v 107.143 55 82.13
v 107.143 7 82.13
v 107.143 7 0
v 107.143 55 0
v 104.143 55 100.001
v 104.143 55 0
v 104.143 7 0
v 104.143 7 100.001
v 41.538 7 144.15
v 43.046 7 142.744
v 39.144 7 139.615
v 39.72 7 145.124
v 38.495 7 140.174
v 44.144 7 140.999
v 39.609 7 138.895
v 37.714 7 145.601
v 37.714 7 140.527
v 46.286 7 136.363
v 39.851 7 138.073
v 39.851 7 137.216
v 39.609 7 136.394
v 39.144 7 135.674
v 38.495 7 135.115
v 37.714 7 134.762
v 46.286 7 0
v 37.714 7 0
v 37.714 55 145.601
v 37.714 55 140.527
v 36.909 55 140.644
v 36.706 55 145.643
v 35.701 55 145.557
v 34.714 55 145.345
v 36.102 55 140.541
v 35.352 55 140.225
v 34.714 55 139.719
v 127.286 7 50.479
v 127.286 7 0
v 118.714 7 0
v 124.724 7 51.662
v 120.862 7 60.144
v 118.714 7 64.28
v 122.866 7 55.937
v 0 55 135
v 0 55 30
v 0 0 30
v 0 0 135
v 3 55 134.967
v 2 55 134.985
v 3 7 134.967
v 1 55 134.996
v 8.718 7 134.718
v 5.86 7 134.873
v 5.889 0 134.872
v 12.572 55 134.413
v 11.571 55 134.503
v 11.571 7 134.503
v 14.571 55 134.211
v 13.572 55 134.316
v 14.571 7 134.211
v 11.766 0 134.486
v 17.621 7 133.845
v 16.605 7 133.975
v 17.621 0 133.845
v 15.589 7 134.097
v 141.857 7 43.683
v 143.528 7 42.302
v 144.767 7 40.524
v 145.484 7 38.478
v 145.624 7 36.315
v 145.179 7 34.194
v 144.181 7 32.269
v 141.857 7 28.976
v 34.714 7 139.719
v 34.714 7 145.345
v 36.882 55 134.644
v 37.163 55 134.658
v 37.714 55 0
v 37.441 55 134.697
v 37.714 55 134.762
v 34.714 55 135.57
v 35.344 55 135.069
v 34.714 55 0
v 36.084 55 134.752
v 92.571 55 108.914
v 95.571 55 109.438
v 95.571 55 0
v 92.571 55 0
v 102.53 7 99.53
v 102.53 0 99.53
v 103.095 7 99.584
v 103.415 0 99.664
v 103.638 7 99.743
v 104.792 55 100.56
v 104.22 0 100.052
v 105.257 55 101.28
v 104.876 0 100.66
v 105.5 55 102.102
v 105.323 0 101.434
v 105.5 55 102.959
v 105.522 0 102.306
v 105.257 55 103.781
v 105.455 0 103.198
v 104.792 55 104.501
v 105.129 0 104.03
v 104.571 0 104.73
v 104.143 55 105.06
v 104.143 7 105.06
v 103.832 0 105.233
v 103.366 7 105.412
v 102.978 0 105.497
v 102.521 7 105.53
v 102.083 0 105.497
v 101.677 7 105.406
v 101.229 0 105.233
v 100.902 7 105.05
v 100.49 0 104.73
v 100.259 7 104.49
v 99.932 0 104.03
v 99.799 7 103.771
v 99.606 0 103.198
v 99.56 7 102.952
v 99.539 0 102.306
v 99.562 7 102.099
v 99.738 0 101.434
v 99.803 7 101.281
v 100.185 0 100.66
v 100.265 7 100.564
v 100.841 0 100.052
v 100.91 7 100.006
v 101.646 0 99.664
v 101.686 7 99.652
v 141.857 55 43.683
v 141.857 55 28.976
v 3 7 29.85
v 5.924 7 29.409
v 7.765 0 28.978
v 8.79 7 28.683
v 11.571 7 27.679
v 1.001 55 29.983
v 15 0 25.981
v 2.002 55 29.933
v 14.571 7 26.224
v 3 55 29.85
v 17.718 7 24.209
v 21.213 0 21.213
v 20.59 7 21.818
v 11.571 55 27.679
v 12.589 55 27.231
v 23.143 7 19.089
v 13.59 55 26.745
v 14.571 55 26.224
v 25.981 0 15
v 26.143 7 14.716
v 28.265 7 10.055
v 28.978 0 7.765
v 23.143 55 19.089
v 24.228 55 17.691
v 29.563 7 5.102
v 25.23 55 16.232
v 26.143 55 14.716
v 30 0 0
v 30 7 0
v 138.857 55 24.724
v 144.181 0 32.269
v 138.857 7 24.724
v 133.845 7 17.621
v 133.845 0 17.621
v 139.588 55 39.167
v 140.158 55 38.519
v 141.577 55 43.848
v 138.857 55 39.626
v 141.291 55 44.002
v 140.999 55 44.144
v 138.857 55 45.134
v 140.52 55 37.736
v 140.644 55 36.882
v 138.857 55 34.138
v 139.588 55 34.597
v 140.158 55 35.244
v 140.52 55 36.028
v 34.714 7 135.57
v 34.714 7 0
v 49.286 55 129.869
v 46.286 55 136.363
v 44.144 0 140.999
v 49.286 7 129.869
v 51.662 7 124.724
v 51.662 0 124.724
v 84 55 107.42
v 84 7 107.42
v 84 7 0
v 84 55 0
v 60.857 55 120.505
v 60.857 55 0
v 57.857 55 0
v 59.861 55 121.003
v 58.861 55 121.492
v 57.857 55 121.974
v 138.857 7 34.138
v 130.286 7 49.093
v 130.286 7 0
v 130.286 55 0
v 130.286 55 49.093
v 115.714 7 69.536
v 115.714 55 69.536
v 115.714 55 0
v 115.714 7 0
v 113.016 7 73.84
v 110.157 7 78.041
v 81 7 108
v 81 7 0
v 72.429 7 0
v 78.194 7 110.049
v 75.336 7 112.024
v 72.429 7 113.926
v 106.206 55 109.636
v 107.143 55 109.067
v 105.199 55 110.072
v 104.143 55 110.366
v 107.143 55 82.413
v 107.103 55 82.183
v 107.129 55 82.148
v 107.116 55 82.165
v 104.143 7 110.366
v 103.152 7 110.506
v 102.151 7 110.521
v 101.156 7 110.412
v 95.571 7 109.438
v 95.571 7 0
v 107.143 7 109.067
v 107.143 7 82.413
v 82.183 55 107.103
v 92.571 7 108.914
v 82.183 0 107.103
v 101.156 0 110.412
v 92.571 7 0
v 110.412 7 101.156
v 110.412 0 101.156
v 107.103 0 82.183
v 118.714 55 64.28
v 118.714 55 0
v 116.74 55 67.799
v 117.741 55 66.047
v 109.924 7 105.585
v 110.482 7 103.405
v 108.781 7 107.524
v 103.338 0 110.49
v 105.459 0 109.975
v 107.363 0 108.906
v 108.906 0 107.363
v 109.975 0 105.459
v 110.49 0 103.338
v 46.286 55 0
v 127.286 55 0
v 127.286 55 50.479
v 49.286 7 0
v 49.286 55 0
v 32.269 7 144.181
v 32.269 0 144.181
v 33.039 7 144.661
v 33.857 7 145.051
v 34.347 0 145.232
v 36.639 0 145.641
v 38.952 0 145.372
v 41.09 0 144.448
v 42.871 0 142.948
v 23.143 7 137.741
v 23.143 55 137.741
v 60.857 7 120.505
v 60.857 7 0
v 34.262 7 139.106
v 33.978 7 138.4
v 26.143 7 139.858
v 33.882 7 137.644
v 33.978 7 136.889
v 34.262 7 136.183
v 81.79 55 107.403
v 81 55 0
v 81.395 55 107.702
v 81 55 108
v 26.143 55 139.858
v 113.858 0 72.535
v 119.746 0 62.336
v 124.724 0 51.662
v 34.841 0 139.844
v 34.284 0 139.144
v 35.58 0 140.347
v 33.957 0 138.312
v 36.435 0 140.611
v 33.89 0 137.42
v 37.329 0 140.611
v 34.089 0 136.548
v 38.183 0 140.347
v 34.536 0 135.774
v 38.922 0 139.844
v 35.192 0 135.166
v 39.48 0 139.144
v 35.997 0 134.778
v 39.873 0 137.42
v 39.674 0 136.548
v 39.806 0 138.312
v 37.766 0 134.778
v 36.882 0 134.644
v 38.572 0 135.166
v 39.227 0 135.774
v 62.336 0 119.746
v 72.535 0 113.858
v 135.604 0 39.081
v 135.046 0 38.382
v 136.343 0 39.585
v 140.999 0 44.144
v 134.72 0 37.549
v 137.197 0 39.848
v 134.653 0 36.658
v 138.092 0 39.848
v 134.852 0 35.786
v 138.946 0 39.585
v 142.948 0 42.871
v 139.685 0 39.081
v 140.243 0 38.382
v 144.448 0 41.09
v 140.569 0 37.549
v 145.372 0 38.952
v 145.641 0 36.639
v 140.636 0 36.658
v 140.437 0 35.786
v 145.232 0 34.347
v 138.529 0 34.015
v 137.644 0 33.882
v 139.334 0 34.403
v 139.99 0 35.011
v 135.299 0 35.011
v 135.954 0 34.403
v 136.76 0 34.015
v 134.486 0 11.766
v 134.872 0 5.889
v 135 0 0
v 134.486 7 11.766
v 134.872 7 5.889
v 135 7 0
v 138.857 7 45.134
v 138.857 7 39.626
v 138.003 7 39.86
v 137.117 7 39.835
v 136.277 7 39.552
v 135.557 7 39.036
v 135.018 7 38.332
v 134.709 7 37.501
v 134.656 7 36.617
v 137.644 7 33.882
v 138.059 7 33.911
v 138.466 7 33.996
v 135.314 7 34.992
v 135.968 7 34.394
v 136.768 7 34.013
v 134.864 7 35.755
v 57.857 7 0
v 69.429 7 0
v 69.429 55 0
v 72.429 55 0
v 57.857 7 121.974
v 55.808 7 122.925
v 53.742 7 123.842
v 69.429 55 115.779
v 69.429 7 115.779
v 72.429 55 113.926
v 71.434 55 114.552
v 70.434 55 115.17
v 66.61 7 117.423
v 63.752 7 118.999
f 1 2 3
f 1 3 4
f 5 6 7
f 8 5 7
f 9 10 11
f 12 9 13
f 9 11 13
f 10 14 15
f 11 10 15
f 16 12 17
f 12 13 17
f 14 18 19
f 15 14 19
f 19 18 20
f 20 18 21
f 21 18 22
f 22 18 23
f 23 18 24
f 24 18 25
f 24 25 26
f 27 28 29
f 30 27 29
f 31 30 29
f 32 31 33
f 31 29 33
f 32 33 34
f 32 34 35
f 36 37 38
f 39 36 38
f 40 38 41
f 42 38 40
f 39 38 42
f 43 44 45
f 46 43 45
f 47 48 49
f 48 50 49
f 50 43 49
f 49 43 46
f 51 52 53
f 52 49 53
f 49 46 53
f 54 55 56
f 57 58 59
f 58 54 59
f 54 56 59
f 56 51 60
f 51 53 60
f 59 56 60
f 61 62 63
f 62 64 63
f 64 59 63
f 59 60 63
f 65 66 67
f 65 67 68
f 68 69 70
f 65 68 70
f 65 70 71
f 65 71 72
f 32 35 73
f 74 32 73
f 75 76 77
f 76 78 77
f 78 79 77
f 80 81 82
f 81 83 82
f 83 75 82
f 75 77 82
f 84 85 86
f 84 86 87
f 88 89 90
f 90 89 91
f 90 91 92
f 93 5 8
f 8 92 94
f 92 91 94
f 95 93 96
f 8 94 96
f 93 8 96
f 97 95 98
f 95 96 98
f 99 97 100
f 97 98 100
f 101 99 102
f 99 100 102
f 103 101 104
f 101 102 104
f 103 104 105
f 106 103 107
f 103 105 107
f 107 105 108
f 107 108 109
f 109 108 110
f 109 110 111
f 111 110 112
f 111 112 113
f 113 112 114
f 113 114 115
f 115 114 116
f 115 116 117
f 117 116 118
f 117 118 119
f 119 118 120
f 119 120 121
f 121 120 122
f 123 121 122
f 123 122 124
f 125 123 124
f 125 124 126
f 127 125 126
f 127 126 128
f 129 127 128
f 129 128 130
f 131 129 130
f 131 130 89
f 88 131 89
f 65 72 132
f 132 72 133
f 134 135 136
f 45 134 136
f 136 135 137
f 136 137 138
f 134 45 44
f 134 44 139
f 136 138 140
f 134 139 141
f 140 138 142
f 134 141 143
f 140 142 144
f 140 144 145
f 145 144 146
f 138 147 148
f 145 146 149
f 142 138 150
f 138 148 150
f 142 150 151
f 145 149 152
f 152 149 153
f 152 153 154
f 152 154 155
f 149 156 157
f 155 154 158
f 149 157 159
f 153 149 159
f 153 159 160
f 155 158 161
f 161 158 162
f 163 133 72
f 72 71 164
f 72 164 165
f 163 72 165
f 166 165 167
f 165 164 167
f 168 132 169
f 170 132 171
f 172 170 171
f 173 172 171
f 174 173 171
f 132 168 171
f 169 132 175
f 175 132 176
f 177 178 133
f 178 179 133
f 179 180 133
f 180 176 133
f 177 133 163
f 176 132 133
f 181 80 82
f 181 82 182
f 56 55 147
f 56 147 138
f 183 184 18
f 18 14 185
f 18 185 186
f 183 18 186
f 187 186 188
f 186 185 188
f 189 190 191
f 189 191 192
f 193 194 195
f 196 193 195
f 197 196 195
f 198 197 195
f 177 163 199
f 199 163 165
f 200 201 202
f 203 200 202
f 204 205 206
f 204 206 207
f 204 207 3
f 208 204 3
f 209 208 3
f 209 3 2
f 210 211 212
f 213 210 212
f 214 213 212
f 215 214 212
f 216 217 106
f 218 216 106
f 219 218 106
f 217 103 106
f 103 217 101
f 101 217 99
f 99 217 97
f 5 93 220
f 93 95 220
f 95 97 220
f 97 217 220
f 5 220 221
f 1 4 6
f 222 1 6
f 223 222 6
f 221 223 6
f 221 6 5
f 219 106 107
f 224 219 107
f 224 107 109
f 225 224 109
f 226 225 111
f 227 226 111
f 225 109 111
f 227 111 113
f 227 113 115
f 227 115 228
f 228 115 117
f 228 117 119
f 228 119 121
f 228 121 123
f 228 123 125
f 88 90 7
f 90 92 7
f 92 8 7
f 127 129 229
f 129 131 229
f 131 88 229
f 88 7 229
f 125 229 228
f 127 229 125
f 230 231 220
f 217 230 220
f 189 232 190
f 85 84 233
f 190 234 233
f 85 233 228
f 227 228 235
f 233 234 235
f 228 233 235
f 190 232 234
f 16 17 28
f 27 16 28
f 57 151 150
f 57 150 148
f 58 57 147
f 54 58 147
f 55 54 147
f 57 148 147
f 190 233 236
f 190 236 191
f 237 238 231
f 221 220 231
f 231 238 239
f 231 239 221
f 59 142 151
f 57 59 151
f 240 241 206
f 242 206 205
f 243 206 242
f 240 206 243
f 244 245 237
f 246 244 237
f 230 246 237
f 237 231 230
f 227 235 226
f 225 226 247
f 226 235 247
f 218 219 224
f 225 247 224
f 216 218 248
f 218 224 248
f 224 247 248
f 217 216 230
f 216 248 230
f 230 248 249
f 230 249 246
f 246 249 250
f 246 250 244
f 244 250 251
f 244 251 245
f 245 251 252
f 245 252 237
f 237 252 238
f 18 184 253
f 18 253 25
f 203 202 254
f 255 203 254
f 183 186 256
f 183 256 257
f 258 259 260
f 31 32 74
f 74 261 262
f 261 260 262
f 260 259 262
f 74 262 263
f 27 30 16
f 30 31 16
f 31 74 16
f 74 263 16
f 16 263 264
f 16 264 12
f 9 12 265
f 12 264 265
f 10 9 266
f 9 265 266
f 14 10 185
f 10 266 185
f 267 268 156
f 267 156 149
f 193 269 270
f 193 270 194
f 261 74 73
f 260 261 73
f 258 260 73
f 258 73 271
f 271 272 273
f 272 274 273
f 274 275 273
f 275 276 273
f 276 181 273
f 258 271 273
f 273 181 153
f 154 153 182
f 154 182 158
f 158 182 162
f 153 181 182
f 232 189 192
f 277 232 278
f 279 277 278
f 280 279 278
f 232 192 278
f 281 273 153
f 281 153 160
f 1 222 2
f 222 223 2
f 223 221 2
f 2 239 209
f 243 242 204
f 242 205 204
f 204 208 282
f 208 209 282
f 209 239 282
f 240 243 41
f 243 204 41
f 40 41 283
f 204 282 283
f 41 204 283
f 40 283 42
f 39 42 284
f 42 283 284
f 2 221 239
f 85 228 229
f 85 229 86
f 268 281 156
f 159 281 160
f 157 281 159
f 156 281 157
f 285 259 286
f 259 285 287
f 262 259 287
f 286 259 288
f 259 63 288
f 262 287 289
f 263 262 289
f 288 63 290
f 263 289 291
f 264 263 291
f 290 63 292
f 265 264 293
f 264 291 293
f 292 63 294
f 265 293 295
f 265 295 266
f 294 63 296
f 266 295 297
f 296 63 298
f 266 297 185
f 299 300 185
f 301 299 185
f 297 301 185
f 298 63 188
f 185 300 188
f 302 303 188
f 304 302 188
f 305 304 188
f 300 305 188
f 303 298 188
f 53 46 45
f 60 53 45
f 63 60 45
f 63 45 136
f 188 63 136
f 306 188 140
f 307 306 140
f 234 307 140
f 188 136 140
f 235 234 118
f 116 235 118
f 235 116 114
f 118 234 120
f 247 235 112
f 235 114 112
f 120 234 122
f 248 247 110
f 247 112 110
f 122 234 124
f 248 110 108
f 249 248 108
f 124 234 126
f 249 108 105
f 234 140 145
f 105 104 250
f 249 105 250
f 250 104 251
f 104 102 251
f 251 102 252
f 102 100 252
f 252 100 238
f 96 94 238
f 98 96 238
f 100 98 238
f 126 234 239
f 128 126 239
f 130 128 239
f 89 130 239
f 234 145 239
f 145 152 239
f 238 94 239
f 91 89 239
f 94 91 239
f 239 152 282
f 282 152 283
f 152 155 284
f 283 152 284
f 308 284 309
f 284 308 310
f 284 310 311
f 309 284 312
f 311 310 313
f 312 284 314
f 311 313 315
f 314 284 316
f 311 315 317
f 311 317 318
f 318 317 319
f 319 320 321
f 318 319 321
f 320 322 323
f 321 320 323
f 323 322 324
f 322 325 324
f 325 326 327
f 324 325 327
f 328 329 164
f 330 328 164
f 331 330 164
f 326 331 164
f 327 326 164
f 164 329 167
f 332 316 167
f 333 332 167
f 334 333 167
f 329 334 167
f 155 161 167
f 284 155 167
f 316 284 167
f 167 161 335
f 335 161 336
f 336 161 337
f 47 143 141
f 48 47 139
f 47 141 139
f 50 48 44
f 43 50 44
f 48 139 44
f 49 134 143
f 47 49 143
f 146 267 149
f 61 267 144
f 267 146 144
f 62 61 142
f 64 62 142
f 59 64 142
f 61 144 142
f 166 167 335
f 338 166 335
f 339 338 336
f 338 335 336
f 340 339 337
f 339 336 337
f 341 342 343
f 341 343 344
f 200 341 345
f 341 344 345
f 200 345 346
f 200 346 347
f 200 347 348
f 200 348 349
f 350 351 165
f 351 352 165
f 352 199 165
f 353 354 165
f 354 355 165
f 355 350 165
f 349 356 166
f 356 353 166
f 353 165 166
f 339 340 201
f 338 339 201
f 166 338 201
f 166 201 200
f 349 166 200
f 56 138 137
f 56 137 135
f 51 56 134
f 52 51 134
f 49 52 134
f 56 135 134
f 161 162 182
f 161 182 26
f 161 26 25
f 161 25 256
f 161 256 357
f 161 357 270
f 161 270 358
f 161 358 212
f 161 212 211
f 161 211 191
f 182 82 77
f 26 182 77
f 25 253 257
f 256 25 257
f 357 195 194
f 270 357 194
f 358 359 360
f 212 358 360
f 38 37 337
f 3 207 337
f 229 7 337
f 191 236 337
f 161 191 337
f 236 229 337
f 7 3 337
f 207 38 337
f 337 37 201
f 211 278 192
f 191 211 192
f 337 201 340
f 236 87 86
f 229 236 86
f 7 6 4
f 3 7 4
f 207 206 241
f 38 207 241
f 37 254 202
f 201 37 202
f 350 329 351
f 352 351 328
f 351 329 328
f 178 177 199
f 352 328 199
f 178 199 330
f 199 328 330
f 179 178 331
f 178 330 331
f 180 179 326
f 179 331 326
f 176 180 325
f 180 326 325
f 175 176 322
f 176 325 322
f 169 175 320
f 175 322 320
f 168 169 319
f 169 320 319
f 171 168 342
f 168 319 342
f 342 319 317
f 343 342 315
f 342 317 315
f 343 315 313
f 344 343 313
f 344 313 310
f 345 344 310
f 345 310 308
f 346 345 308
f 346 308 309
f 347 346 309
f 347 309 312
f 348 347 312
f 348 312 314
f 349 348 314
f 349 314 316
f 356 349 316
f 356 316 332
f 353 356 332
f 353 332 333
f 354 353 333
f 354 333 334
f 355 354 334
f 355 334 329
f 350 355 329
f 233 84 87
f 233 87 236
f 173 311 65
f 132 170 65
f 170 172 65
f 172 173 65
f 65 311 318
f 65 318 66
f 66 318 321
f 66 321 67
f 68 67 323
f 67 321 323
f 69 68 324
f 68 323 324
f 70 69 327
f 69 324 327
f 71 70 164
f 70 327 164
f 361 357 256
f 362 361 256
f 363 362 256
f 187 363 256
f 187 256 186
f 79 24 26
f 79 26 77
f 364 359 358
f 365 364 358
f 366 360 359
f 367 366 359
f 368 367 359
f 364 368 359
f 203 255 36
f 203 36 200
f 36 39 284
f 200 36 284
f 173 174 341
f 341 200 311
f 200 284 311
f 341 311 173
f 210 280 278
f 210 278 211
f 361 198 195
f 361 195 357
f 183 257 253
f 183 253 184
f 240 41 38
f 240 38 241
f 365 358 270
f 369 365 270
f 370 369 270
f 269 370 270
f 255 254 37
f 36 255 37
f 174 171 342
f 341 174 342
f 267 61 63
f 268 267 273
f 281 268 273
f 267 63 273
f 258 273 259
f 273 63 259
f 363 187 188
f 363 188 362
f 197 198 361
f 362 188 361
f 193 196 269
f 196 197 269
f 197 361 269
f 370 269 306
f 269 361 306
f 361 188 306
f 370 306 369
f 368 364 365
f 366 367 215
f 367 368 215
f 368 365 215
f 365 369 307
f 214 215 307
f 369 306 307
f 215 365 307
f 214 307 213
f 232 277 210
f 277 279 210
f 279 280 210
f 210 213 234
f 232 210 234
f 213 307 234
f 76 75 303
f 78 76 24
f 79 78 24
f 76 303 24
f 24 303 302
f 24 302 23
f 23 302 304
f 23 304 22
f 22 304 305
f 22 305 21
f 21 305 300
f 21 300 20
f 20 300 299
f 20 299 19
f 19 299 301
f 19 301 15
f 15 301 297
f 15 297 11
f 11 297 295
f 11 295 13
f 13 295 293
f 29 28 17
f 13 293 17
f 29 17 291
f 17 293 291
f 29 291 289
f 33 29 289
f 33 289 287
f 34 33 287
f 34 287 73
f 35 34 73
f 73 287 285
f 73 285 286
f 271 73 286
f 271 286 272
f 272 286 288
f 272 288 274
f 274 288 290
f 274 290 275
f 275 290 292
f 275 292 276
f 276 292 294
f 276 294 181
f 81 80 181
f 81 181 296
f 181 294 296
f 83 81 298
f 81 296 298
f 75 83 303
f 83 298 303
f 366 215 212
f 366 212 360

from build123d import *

# Parameters (mm, degrees)
BOSS_EXTRUDE1_DEPTH = 1000
SKETCH2_R           = 3
CUT_EXTRUDE2_DEPTH  = 1016.012315196
SKETCH3_R           = 30
CUT_EXTRUDE3_DEPTH  = 67


with BuildPart() as part:
    # Sketch1 → Boss-Extrude1 (new body)
    with BuildSketch(Plane.XY):
        Polygon((11.571428571, 55), (11.571428571, 7), (3, 7), (3, 55), (0, 55), (0, 7), (0, 0), (165, 0), (165, 7), (165, 10), (165, 55), (162, 55), (162, 7), (153.428571429, 7), (153.428571429, 55), (150.428571429, 55), (150.428571429, 7), (141.857142857, 7), (141.857142857, 55), (138.857142857, 55), (138.857142857, 7), (130.285714286, 7), (130.285714286, 55), (127.285714286, 55), (127.285714286, 7), (118.714285714, 7), (118.714285714, 55), (115.714285714, 55), (115.714285714, 7), (107.142857143, 7), (107.142857143, 55), (104.142857143, 55), (104.142857143, 7), (95.571428571, 7), (95.571428571, 55), (92.571428571, 55), (92.571428571, 7), (84, 7), (84, 55), (81, 55), (81, 7), (72.428571429, 7), (72.428571429, 55), (69.428571429, 55), (69.428571429, 7), (60.857142857, 7), (60.857142857, 55), (57.857142857, 55), (57.857142857, 7), (49.285714286, 7), (49.285714286, 55), (46.285714286, 55), (46.285714286, 7), (37.714285714, 7), (37.714285714, 55), (34.714285714, 55), (34.714285714, 7), (26.142857143, 7), (26.142857143, 55), (23.142857143, 55), (23.142857143, 7), (14.571428571, 7), (14.571428571, 55), align=None)
    extrude(amount=BOSS_EXTRUDE1_DEPTH)

    # Sketch2 → Cut-Extrude2 (cut, through all)
    with BuildSketch(Plane.XZ):
        with BuildLine():
            Line((0, 1000), (0, 135))
            ThreePointArc((0, 135), (8.829422446, 134.710954637), (17.62103595, 133.845056285))
            Line((17.62103595, 133.845056285), (32.26946717, 144.181033328))
            ThreePointArc((32.26946717, 144.181033328), (38.952266288, 145.371836857), (44.144338328, 140.999171191))
            Line((44.144338328, 140.999171191), (51.662263369, 124.723736889))
            ThreePointArc((51.662263369, 124.723736889), (67.5, 116.913429511), (82.182792916, 107.102700939))
            Line((82.182792916, 107.102700939), (101.156071179, 110.411535956))
            ThreePointArc((101.156071179, 110.411535956), (108.187337522, 108.187337522), (110.411535956, 101.156071179))
            Line((110.411535956, 101.156071179), (107.102700939, 82.182792916))
            ThreePointArc((107.102700939, 82.182792916), (116.913429511, 67.5), (124.723736889, 51.662263369))
            Line((124.723736889, 51.662263369), (140.999171191, 44.144338328))
            ThreePointArc((140.999171191, 44.144338328), (145.371836857, 38.952266288), (144.181033328, 32.26946717))
            Line((144.181033328, 32.26946717), (133.845056285, 17.62103595))
            ThreePointArc((133.845056285, 17.62103595), (134.710954637, 8.829422446), (135, 0))
            Line((135, 0), (165, 0))
            Line((165, 0), (165, 1000))
            Line((165, 1000), (0, 1000))
        make_face()
        with Locations(Location((36.881713927, 137.644430246, 0), (0, 0, 270))):
            Circle(SKETCH2_R)
        with Locations(Location((102.530483272, 102.530483272, 0), (0, 0, 270))):
            Circle(SKETCH2_R)
        with Locations(Location((137.644430246, 36.881713927, 0), (0, 0, 270))):
            Circle(SKETCH2_R)
    extrude(amount=-CUT_EXTRUDE2_DEPTH, mode=Mode.SUBTRACT)

    # Sketch3 → Cut-Extrude3 (cut)
    with BuildSketch(Plane(origin=(0, 55, 0), x_dir=(1, 0, 0), z_dir=(0, 1, 0))):
        Circle(SKETCH3_R)
    extrude(amount=-CUT_EXTRUDE3_DEPTH, mode=Mode.SUBTRACT)


solid = part.part
